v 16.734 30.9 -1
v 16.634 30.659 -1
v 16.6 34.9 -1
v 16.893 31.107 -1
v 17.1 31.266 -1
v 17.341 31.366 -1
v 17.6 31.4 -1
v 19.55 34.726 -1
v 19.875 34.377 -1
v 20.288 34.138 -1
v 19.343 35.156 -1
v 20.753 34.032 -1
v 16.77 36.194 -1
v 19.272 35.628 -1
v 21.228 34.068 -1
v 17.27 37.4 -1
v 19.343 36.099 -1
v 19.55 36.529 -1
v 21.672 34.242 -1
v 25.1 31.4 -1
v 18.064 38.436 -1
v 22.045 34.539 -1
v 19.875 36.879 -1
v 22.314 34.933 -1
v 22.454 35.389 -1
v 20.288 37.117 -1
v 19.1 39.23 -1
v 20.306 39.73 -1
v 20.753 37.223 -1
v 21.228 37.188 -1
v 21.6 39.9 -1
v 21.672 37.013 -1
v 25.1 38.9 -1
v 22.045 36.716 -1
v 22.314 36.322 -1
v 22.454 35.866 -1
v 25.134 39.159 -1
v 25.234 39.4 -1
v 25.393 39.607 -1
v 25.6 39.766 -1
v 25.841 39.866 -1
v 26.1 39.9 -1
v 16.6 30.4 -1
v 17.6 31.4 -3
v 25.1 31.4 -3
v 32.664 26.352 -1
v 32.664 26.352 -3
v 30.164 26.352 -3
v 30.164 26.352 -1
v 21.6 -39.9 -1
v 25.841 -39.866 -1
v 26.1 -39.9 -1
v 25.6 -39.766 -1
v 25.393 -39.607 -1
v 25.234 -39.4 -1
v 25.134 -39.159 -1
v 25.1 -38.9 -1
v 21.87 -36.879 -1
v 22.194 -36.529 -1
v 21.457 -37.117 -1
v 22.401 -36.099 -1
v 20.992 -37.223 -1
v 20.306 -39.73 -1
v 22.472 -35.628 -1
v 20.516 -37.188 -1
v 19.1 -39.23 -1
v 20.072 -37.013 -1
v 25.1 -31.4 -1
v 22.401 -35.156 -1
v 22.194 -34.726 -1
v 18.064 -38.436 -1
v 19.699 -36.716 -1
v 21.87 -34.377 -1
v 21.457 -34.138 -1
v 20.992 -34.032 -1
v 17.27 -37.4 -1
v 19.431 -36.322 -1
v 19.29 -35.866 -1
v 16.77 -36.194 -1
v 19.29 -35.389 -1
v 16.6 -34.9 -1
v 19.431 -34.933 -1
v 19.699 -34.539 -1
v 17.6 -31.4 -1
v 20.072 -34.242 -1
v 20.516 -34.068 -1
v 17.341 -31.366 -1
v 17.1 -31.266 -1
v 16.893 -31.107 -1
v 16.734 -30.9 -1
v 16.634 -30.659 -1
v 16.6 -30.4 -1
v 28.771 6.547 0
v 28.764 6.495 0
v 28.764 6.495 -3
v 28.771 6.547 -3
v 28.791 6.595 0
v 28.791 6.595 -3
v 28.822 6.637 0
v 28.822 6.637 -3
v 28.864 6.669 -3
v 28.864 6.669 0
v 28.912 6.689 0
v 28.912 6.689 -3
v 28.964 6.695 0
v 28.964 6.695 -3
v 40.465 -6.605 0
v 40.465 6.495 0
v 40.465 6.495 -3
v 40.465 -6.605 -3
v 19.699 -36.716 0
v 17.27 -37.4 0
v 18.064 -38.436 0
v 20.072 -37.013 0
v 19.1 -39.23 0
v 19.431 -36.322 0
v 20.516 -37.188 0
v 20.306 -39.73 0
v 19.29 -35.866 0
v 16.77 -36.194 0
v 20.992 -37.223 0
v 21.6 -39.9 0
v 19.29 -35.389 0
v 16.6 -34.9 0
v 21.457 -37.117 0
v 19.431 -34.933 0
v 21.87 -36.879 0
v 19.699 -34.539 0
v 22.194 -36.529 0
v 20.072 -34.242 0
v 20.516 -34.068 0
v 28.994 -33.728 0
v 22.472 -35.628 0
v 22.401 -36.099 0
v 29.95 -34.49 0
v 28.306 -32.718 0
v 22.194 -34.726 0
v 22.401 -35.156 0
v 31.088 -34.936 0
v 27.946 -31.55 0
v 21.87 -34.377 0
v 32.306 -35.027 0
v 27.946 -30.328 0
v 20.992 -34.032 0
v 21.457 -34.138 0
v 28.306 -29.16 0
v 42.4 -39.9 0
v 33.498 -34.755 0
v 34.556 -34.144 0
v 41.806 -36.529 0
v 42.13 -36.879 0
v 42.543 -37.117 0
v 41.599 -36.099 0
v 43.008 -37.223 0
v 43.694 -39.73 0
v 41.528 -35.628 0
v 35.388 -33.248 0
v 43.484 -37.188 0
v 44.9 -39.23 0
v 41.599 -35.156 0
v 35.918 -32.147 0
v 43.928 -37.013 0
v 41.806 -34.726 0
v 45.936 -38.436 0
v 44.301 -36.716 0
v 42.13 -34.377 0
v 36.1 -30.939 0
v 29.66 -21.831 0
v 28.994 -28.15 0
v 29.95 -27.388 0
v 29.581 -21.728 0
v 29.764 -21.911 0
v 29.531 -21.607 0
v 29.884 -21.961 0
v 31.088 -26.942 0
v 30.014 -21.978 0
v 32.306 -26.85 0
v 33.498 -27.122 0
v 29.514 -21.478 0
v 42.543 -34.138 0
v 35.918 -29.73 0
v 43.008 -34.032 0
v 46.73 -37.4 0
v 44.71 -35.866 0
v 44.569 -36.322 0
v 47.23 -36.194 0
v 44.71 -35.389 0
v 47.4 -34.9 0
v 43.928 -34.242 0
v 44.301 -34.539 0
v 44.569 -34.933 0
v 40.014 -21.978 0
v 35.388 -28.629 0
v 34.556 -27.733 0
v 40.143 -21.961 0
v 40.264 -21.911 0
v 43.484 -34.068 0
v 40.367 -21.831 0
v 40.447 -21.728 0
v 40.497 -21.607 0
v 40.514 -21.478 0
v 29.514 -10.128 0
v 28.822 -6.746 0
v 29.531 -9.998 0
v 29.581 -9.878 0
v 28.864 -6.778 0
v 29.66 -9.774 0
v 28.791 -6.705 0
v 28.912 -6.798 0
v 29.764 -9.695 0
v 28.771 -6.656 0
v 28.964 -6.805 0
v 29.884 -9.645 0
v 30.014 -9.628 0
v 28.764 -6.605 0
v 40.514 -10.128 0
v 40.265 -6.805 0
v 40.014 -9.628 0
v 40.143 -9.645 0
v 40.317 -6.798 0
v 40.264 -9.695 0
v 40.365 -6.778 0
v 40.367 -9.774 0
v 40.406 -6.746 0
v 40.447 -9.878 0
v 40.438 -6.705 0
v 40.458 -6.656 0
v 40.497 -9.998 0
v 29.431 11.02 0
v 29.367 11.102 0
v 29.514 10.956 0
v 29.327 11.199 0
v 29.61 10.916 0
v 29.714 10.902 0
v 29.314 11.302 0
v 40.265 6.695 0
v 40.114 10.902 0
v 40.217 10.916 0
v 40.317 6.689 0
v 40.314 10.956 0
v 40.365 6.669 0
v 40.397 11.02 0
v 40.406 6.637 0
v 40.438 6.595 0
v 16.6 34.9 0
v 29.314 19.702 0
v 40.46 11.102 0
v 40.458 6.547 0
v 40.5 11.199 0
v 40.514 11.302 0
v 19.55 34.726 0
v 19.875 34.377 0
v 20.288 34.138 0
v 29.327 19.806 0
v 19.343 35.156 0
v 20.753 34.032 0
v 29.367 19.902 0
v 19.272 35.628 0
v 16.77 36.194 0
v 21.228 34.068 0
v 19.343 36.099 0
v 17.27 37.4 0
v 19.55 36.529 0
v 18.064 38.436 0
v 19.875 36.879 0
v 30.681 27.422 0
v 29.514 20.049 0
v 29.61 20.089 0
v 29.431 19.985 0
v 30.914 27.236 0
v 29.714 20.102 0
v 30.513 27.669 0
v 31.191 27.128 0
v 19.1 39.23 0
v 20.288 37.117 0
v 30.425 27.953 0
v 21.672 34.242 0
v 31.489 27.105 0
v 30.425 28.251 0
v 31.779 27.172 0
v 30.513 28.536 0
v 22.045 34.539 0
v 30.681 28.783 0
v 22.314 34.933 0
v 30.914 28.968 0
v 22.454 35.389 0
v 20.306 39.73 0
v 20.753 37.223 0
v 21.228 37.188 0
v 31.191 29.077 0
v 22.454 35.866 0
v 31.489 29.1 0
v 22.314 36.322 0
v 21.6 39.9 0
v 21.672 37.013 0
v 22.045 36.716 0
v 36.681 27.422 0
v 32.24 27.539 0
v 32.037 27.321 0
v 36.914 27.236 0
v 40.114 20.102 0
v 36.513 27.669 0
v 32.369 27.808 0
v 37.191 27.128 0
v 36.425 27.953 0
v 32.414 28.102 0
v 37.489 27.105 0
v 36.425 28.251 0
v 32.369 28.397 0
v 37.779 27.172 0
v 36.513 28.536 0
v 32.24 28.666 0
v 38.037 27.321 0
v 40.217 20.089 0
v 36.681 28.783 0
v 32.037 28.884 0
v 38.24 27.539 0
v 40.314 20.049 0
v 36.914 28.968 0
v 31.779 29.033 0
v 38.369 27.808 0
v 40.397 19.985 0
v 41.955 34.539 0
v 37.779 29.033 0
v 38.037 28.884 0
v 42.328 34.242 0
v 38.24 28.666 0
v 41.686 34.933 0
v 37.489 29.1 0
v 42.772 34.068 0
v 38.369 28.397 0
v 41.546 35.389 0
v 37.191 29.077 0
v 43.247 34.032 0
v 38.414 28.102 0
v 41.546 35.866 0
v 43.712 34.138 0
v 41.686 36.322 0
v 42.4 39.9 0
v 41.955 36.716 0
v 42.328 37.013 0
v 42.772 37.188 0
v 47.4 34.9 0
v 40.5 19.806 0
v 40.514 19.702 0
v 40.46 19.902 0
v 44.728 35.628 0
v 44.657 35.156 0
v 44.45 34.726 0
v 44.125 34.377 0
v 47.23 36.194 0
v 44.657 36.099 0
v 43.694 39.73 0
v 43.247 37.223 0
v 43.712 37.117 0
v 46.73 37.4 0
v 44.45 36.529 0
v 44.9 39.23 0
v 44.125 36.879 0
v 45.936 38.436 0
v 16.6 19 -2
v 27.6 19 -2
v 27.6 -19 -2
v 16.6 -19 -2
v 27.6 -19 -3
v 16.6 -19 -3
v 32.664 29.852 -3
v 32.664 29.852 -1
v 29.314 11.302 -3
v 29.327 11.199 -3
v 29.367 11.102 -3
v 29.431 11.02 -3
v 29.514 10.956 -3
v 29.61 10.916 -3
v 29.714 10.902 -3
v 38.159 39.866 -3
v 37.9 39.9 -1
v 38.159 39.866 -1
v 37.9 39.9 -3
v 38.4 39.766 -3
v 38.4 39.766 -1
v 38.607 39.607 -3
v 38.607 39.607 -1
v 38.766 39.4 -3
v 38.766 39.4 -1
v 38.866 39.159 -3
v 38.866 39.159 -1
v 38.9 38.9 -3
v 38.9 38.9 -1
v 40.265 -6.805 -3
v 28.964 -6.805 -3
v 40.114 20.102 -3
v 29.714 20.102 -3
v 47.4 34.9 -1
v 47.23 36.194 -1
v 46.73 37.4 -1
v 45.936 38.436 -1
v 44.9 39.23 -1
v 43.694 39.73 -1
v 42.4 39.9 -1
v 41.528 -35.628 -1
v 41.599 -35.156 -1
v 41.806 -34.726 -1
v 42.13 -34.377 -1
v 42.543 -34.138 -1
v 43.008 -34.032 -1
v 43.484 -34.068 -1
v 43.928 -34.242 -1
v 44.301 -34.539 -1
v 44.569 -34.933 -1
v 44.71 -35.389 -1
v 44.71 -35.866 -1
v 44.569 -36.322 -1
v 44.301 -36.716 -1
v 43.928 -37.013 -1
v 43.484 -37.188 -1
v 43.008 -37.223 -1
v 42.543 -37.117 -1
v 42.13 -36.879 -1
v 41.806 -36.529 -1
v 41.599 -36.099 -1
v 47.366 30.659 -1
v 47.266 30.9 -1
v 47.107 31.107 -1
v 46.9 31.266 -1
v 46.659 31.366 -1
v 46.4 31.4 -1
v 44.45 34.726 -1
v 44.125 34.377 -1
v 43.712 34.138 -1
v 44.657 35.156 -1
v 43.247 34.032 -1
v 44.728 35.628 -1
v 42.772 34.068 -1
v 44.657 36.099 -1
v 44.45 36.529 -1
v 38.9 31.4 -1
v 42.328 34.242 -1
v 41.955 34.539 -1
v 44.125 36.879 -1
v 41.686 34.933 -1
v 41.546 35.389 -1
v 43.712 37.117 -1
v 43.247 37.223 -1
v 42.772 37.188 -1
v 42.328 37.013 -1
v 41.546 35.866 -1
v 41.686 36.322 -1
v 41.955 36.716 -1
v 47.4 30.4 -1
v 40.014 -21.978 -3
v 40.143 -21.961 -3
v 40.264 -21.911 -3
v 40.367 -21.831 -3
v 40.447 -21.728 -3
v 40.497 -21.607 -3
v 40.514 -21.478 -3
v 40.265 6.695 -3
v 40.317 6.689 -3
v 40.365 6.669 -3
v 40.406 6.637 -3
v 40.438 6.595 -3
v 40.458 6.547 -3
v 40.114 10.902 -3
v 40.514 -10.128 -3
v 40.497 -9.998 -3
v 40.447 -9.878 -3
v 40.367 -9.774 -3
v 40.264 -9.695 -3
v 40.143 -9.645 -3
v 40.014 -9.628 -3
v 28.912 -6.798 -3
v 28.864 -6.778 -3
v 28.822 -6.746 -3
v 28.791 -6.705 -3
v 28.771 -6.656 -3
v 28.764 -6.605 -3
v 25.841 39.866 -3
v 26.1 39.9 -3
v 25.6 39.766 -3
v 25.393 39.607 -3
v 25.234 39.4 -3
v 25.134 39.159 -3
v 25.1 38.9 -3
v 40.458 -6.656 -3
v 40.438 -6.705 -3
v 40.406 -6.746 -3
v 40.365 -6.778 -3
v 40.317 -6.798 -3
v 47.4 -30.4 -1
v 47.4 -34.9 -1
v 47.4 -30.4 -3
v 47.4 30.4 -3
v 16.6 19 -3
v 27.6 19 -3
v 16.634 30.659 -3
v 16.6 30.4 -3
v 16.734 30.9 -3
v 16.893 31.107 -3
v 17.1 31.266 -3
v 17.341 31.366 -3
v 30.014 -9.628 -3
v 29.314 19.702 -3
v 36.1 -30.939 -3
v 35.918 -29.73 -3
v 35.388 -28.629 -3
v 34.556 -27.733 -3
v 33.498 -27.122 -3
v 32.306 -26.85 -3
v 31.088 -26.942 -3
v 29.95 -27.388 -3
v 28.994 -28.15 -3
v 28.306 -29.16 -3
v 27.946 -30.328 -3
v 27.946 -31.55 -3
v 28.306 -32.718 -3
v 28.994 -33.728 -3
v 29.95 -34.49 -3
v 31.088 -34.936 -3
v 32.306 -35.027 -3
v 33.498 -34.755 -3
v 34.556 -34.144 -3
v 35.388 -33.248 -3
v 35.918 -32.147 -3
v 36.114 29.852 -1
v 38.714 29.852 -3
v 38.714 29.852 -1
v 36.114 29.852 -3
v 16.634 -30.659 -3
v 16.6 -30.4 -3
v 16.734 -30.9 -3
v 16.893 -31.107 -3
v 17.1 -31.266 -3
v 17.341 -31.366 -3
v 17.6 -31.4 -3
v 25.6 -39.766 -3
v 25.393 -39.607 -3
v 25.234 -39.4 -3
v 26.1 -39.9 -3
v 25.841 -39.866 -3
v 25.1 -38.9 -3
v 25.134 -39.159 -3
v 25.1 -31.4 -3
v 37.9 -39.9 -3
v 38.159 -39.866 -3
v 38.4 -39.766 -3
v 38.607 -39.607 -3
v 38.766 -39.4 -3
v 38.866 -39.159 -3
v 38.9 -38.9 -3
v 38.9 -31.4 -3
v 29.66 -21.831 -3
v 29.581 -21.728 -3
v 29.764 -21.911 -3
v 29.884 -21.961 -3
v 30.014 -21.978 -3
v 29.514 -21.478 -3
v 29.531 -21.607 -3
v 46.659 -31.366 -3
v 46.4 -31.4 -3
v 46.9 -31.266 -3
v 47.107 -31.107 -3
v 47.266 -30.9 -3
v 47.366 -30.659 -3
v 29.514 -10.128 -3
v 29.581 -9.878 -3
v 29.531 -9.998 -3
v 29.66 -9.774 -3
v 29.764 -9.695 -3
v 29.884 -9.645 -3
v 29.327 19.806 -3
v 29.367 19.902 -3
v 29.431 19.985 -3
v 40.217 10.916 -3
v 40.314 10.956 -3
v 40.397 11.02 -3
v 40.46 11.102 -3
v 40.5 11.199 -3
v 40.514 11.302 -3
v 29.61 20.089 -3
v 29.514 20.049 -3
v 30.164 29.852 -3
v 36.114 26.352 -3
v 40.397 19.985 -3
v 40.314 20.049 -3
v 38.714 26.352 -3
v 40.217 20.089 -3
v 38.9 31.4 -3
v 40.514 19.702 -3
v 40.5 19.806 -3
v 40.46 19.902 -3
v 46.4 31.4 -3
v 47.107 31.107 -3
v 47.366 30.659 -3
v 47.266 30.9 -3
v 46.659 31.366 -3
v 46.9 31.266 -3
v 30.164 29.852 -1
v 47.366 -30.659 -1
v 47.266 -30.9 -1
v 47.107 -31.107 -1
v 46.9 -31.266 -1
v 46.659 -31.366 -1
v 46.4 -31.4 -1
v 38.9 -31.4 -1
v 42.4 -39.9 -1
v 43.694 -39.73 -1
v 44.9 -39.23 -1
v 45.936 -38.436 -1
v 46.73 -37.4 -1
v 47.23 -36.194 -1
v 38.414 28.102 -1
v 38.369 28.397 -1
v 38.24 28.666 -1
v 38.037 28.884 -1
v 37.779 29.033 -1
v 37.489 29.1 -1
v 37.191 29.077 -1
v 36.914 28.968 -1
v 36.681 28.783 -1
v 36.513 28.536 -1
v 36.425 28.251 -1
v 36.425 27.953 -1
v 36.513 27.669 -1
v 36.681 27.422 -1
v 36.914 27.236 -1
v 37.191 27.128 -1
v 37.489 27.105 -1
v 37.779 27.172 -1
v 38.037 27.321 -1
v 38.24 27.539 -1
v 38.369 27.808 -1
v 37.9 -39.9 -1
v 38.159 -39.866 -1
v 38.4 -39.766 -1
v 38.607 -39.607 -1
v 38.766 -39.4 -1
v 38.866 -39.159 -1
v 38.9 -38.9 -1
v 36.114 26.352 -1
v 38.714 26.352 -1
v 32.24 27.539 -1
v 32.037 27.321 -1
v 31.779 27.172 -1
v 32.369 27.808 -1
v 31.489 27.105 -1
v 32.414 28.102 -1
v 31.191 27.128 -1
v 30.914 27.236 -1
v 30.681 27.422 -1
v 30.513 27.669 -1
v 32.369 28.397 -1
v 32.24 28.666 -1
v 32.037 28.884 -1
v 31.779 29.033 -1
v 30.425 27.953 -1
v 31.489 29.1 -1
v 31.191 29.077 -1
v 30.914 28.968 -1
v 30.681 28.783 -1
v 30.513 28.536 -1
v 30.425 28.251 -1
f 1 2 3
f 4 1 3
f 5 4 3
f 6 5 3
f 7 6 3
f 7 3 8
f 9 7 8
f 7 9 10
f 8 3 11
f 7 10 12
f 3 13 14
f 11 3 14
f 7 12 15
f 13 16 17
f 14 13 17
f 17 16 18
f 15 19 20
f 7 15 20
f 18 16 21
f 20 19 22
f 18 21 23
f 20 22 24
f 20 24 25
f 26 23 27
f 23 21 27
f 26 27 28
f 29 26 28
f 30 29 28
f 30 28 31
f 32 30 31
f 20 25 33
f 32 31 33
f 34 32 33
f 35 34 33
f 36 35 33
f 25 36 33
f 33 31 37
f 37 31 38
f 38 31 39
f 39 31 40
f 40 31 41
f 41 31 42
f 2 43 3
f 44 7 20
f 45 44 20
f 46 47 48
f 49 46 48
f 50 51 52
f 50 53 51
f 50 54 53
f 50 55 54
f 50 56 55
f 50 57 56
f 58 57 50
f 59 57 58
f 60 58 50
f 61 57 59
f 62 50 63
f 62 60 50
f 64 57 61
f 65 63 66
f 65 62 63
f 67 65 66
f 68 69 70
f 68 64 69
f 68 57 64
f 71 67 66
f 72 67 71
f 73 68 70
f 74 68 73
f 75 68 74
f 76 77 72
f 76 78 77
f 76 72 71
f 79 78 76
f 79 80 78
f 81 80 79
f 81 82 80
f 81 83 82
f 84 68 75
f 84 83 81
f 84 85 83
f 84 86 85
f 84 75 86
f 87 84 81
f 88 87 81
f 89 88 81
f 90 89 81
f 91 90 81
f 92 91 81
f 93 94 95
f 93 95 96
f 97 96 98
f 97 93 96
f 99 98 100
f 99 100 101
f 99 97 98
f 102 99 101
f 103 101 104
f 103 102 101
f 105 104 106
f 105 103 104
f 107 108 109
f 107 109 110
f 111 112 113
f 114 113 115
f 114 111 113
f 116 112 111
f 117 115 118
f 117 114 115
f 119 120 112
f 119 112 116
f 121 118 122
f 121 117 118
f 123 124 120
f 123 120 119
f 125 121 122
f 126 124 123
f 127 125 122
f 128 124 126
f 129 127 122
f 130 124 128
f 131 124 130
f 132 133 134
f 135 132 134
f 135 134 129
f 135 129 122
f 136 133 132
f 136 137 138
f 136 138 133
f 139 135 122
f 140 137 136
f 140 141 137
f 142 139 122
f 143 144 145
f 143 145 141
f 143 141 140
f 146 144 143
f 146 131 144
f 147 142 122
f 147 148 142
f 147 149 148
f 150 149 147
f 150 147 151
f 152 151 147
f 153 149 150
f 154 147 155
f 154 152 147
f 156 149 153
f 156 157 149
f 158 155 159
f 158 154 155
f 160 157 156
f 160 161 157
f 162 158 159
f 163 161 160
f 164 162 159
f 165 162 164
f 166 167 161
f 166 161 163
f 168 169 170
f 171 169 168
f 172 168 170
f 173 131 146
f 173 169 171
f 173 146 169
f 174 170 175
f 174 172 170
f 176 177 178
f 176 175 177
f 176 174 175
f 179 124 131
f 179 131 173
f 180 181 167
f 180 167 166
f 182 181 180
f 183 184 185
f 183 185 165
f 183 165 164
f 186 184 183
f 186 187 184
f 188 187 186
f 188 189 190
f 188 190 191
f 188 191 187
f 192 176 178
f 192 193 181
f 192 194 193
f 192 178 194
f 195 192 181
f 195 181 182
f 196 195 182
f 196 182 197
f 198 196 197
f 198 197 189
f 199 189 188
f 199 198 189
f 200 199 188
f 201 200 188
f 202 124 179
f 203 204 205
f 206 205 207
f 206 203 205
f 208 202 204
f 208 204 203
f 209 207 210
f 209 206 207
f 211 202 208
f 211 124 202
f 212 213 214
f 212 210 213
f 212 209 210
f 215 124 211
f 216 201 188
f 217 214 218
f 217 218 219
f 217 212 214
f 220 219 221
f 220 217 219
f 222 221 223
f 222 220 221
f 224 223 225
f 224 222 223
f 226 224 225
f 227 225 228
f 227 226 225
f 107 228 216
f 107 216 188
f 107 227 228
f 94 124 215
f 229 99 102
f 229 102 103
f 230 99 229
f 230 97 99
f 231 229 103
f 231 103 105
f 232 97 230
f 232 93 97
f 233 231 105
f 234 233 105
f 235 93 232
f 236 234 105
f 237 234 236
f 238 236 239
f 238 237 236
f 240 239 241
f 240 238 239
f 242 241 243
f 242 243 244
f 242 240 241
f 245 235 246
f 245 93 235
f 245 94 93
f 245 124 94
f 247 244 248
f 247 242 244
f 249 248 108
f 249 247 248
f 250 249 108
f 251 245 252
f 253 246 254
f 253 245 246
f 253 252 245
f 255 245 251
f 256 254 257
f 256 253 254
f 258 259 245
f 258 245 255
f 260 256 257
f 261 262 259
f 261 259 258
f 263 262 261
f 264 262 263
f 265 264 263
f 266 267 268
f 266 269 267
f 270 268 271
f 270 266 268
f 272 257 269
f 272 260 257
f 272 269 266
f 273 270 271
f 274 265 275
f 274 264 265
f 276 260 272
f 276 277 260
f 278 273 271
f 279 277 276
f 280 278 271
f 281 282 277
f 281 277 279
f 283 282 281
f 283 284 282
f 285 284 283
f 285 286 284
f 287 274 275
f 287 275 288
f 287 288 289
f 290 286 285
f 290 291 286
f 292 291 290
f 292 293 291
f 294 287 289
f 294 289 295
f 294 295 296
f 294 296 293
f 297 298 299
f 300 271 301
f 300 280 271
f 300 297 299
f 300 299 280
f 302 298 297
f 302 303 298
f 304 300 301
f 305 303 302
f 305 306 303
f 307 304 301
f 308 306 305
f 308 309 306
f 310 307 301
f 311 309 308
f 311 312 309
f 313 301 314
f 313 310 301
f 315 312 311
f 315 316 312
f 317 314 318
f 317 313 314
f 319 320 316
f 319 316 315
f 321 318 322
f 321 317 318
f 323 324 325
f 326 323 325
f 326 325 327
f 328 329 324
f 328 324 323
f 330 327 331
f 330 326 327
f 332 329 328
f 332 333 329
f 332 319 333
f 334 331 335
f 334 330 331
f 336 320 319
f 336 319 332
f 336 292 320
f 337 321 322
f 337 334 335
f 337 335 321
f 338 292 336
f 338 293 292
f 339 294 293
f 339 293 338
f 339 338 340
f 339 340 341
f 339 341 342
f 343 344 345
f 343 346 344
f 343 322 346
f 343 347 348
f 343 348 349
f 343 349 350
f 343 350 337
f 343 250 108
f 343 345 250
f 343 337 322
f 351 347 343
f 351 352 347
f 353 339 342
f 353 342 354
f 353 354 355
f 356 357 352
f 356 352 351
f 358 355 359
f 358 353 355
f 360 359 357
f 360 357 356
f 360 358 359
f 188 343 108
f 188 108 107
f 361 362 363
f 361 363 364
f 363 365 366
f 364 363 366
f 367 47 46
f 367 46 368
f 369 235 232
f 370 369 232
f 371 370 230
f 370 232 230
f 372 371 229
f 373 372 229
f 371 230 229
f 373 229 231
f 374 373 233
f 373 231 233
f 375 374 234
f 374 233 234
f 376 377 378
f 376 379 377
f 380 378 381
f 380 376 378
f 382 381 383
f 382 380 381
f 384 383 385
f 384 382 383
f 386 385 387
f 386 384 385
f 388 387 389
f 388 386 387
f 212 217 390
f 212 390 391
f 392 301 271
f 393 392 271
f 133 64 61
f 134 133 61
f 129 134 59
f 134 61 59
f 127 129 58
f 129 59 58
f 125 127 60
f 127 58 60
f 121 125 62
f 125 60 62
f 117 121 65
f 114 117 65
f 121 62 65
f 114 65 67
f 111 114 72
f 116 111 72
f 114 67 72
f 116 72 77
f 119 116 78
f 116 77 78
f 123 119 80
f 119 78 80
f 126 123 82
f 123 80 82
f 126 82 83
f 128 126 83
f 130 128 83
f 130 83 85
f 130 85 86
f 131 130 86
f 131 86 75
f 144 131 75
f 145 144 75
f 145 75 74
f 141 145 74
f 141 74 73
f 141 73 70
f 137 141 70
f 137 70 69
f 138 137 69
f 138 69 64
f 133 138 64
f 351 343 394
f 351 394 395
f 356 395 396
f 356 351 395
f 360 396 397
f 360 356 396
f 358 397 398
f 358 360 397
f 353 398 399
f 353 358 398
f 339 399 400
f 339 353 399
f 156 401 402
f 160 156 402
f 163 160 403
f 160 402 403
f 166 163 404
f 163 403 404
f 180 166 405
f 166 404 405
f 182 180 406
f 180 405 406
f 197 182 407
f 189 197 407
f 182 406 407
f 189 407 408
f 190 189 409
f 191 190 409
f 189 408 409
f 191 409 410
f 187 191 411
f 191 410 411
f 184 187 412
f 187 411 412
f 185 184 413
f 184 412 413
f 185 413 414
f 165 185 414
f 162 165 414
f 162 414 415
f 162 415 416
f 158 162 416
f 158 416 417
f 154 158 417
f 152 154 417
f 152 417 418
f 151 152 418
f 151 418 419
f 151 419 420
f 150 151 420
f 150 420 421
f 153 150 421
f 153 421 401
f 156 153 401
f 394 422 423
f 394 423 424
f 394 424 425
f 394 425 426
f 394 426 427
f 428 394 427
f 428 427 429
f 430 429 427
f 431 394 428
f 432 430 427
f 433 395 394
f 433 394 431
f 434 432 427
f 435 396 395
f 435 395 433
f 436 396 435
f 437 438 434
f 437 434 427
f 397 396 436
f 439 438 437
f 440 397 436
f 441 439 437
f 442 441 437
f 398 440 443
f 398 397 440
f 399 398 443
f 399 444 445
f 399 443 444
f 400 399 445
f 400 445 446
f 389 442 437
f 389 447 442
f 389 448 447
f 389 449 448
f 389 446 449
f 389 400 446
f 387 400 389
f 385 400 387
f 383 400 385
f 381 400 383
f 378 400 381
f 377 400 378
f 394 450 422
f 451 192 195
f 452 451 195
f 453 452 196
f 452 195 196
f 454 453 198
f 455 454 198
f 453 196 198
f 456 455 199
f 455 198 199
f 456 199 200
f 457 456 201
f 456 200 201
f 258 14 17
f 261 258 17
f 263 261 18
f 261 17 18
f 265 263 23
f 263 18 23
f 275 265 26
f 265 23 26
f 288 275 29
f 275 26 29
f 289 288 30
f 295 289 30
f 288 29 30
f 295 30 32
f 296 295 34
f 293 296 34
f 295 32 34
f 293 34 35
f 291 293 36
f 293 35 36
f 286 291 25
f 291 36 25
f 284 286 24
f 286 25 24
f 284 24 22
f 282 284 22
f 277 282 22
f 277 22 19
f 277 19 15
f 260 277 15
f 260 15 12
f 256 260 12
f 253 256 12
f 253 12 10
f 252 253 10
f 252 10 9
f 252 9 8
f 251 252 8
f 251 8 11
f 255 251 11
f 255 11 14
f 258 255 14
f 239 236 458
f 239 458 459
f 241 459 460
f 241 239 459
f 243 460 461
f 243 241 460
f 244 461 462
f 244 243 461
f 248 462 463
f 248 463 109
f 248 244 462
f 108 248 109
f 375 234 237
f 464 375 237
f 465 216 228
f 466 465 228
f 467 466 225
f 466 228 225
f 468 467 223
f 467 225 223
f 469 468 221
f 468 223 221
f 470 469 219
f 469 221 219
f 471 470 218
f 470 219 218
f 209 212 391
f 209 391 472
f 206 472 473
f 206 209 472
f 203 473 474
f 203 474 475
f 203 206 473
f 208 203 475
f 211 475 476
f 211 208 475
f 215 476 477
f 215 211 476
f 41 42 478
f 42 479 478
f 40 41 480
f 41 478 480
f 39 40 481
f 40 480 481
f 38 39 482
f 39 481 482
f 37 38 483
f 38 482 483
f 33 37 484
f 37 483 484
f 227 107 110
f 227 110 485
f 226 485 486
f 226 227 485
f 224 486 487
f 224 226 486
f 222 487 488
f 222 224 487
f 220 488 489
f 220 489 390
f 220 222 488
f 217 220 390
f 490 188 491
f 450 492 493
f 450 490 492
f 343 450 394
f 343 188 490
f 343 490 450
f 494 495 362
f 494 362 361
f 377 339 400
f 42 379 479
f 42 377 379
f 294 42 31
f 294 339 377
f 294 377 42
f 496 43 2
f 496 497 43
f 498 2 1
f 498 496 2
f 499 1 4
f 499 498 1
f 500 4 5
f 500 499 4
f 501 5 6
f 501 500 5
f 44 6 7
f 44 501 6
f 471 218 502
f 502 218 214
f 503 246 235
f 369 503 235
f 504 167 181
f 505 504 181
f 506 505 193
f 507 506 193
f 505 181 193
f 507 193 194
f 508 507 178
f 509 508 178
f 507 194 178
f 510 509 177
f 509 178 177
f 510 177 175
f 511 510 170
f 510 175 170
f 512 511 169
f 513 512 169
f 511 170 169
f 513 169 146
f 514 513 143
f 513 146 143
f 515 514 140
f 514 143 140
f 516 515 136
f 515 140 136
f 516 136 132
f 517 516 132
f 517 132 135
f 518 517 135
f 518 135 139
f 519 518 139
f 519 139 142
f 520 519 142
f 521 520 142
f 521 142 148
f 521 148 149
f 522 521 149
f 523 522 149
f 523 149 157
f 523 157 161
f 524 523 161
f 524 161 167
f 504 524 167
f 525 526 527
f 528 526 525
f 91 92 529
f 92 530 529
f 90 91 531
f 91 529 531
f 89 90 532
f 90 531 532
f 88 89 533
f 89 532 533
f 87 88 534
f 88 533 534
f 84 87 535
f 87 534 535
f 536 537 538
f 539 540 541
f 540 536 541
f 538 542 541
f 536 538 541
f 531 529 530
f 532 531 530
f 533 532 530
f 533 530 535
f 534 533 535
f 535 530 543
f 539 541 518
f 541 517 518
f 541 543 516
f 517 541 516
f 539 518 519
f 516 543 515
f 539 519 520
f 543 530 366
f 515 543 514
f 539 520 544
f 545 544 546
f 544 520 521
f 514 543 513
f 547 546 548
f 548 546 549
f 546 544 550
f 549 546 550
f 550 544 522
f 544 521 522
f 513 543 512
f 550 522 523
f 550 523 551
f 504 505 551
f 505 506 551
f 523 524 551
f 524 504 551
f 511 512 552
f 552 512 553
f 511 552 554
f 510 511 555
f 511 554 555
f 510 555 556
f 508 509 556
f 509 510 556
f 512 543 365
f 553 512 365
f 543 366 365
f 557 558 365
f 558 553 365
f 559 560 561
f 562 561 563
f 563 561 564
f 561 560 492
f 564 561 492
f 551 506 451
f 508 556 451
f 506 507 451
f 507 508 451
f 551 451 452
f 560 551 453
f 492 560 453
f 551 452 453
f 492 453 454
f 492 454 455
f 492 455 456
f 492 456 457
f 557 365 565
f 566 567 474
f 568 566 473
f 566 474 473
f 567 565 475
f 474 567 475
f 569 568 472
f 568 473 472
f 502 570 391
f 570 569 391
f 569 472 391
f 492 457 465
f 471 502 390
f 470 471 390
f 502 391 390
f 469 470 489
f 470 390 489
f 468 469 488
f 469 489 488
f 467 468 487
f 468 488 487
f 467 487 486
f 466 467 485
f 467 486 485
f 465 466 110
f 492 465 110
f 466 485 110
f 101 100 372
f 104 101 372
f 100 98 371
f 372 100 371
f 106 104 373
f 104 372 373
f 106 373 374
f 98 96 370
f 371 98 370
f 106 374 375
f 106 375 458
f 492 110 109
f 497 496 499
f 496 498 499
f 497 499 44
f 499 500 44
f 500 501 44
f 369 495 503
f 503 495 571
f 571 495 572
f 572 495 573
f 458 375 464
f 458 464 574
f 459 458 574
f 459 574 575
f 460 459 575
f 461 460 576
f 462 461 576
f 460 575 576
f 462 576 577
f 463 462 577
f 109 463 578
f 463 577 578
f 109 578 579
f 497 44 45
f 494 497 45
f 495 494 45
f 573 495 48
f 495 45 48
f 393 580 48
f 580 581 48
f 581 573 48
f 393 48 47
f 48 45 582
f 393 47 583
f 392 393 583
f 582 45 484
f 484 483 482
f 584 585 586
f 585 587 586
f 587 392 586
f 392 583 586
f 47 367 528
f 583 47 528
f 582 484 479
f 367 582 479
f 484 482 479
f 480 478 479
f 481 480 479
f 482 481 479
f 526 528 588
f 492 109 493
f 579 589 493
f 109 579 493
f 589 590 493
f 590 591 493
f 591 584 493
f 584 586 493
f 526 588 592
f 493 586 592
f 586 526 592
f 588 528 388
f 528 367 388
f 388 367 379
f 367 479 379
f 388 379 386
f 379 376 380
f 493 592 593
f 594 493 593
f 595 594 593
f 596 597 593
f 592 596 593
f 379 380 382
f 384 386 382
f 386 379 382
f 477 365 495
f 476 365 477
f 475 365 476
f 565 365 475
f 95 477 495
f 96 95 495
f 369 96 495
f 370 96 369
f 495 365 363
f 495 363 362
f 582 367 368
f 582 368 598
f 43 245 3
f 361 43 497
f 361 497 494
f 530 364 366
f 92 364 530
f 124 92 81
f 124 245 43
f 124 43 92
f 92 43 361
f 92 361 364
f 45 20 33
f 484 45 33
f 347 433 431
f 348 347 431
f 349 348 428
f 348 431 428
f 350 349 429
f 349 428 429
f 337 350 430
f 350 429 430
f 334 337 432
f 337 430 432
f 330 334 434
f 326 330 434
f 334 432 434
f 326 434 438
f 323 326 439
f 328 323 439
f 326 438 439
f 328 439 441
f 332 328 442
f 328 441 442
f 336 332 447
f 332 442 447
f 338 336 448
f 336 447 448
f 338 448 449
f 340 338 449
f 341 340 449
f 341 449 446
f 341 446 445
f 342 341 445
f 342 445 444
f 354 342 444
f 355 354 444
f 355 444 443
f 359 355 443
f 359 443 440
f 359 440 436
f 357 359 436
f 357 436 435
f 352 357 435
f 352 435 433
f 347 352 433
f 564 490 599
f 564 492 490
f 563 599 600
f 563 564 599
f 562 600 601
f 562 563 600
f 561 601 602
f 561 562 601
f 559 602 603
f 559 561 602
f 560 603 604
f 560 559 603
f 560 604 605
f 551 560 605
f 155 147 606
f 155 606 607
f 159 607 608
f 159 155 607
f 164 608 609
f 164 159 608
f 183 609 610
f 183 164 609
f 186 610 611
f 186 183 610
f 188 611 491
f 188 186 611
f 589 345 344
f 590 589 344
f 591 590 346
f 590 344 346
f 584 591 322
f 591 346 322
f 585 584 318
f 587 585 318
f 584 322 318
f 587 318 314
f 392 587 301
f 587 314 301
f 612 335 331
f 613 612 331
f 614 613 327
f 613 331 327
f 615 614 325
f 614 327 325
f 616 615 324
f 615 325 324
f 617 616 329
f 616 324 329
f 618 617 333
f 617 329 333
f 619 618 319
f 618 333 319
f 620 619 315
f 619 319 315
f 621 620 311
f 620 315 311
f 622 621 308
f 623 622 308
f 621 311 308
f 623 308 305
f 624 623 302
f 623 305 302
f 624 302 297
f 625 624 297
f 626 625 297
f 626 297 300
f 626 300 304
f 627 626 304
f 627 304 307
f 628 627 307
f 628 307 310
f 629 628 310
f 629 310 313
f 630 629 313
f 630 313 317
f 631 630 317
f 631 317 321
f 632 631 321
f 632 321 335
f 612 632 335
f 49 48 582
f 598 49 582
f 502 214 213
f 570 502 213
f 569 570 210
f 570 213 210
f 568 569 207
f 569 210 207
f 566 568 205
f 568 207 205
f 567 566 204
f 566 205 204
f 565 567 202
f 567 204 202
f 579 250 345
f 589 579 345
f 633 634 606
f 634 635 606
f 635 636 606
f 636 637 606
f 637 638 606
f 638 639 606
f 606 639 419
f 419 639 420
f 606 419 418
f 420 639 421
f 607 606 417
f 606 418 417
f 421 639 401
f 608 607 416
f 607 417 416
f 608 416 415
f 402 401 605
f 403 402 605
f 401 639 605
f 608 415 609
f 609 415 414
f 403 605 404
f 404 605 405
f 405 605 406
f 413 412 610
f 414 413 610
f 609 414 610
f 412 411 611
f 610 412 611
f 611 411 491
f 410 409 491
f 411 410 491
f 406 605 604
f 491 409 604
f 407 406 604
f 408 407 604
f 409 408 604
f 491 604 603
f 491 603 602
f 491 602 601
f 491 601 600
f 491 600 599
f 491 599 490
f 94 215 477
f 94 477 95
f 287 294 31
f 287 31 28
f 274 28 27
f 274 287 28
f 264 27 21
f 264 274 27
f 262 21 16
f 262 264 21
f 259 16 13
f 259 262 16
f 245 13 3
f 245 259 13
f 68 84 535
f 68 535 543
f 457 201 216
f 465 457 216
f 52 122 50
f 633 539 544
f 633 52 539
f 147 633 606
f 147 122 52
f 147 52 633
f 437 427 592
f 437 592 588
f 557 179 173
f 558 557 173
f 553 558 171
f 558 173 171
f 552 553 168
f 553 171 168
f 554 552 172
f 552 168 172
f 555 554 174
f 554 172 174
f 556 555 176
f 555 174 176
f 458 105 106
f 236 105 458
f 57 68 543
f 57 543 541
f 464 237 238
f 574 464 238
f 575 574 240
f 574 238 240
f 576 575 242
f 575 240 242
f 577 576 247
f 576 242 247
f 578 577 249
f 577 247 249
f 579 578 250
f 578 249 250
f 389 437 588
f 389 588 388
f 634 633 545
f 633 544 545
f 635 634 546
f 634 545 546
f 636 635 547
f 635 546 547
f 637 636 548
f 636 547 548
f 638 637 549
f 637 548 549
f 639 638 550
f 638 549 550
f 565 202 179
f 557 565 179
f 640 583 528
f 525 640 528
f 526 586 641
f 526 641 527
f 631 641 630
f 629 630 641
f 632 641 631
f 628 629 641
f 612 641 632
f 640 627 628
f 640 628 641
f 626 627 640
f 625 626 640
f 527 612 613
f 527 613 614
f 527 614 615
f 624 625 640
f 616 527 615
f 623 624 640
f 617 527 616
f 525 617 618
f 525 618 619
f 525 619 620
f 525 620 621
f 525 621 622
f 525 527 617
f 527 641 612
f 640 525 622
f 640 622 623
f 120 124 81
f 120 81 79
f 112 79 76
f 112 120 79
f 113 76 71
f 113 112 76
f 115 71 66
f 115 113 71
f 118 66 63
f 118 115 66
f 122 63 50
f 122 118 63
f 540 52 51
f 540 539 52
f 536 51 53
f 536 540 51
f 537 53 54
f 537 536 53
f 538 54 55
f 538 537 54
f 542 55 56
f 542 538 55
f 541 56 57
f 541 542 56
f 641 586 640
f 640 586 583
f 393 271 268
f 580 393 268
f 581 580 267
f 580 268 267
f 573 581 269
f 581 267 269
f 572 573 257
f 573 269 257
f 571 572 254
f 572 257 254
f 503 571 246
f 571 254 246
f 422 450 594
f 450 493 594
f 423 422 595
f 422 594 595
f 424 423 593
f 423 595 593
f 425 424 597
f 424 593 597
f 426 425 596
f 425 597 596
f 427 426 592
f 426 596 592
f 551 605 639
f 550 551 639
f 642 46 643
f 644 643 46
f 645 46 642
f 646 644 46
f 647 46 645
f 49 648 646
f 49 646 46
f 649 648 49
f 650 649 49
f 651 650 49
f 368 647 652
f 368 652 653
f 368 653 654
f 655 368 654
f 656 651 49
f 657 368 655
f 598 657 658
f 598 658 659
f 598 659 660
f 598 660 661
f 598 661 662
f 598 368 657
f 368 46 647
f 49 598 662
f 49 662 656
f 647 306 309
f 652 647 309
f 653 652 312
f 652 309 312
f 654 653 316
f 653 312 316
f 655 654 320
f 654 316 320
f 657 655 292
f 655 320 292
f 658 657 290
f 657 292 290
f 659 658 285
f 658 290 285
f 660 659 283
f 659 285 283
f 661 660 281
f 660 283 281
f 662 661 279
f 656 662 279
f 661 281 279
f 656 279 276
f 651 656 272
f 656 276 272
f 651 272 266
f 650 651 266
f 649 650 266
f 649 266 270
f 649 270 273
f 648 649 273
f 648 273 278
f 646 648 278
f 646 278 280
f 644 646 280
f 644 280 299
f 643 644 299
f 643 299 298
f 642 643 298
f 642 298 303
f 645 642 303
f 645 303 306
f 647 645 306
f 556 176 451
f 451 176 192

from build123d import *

# Parameters (mm, degrees)
SKETCH_1_R          = 1
EXTRUDE_1_DEPTH     = 3
SKETCH_2_W          = 11
SKETCH_2_H          = 38
CUT_EXTRUDE_1_DEPTH = 1
CUT_EXTRUDE_START   = -2
CUT_EXTRUDE_2_DEPTH = 2
SKETCH_4_R          = 1.6
CUT_EXTRUDE_3_DEPTH = 62.990079852
SKETCH_6_W          = 2.6
SKETCH_6_H          = 3.5
SKETCH_6_W_2        = 2.5
CUT_EXTRUDE_4_DEPTH = 2
SKETCH_7_R          = 4.1
CUT_EXTRUDE_5_DEPTH = 63.030395775
FILLET_1_R          = 1


with BuildPart() as part:
    # 草图1 → 凸台-拉伸1 (new body)
    with BuildSketch(Plane.XY):
        with BuildLine():
            Line((47.4, -34.9), (47.4, 34.9))
            ThreePointArc((47.4, 34.9), (45.935533906, 38.435533906), (42.4, 39.9))
            Line((42.4, 39.9), (21.6, 39.9))
            ThreePointArc((21.6, 39.9), (18.064466094, 38.435533906), (16.6, 34.9))
            Line((16.6, 34.9), (16.6, -34.9))
            ThreePointArc((16.6, -34.9), (18.064466094, -38.435533906), (21.6, -39.9))
            Line((21.6, -39.9), (42.4, -39.9))
            ThreePointArc((42.4, -39.9), (45.935533906, -38.435533906), (47.4, -34.9))
        make_face()
        with Locations((37.413843028, 28.102429875)):
            Circle(SKETCH_1_R, mode=Mode.SUBTRACT)
        with Locations((31.413843028, 28.102429875)):
            Circle(SKETCH_1_R, mode=Mode.SUBTRACT)
        with BuildLine():
            Line((40.513850359, -21.477641558), (40.513850359, -10.127641653))
            ThreePointArc((40.513850359, -10.127641653), (40.367403749, -9.774088262), (40.013850359, -9.627641653))
            Line((40.013850359, -9.627641653), (30.013850359, -9.627641653))
            ThreePointArc((30.013850359, -9.627641653), (29.660296968, -9.774088262), (29.513850359, -10.127641653))
            Line((29.513850359, -10.127641653), (29.513850359, -21.477641558))
            ThreePointArc((29.513850359, -21.477641558), (29.660296968, -21.831194949), (30.013850359, -21.977641558))
            Line((30.013850359, -21.977641558), (40.013850359, -21.977641558))
            ThreePointArc((40.013850359, -21.977641558), (40.367403749, -21.831194949), (40.513850359, -21.477641558))
        make_face(mode=Mode.SUBTRACT)
        with BuildLine():
            Line((40.464996896, 6.495389649), (40.464996896, -6.604609867))
            ThreePointArc((40.464996896, -6.604609867), (40.406418252, -6.746031223), (40.264996896, -6.804609867))
            Line((40.264996896, -6.804609867), (28.963873947, -6.804609867))
            ThreePointArc((28.963873947, -6.804609867), (28.822452591, -6.746031223), (28.763873947, -6.604609867))
            Line((28.763873947, -6.604609867), (28.763873947, 6.495389649))
            ThreePointArc((28.763873947, 6.495389649), (28.822452591, 6.636811005), (28.963873947, 6.695389649))
            Line((28.963873947, 6.695389649), (40.264996896, 6.695389649))
            ThreePointArc((40.264996896, 6.695389649), (40.406418252, 6.636811005), (40.464996896, 6.495389649))
        make_face(mode=Mode.SUBTRACT)
        with BuildLine():
            Line((40.513843009, 11.302412116), (40.513843009, 19.702429875))
            ThreePointArc((40.513843009, 19.702429875), (40.396685721, 19.985272588), (40.113843009, 20.102429875))
            Line((40.113843009, 20.102429875), (29.713821303, 20.102429875))
            ThreePointArc((29.713821303, 20.102429875), (29.43097859, 19.985272588), (29.313821303, 19.702429875))
            Line((29.313821303, 19.702429875), (29.313821303, 11.302412116))
            ThreePointArc((29.313821303, 11.302412116), (29.43097859, 11.019569403), (29.713821303, 10.902412116))
            Line((29.713821303, 10.902412116), (40.113843009, 10.902412116))
            ThreePointArc((40.113843009, 10.902412116), (40.396685721, 11.019569403), (40.513843009, 11.302412116))
        make_face(mode=Mode.SUBTRACT)
    extrude(amount=-EXTRUDE_1_DEPTH)

    # 草图2 → 切除-拉伸1 (cut)
    with BuildSketch(Plane(origin=(0, 0, -3), x_dir=(-1, 0, 0), z_dir=(0, 0, -1))):
        with Locations((-22.1, 0)):
            Rectangle(SKETCH_2_W, SKETCH_2_H)
    extrude(amount=-CUT_EXTRUDE_1_DEPTH, mode=Mode.SUBTRACT)

    # 草图3 → 切除-拉伸2 (cut)
    with BuildSketch(Plane(origin=(0, 0, -3), x_dir=(-1, 0, 0), z_dir=(0, 0, -1)).offset(CUT_EXTRUDE_START)):
        with BuildLine():
            Line((-47.4, -31.4), (-38.9, -31.4))
            Line((-38.9, -31.4), (-38.9, -39.9))
            Line((-38.9, -39.9), (-42.4, -39.9))
            ThreePointArc((-42.4, -39.9), (-45.935533906, -38.435533906), (-47.4, -34.9))
            Line((-47.4, -34.9), (-47.4, -31.4))
        make_face()
        with BuildLine():
            Line((-47.4, 34.9), (-47.4, 31.4))
            Line((-47.4, 31.4), (-38.9, 31.4))
            Line((-38.9, 31.4), (-38.9, 39.9))
            Line((-38.9, 39.9), (-42.4, 39.9))
            ThreePointArc((-42.4, 39.9), (-45.935533906, 38.435533906), (-47.4, 34.9))
        make_face()
        with BuildLine():
            Line((-16.6, 31.4), (-25.1, 31.4))
            Line((-25.1, 31.4), (-25.1, 39.9))
            Line((-25.1, 39.9), (-21.6, 39.9))
            ThreePointArc((-21.6, 39.9), (-18.064466094, 38.435533906), (-16.6, 34.9))
            Line((-16.6, 34.9), (-16.6, 31.4))
        make_face()
        with BuildLine():
            Line((-16.6, -34.9), (-16.6, -31.4))
            Line((-16.6, -31.4), (-25.1, -31.4))
            Line((-25.1, -31.4), (-25.1, -39.9))
            Line((-25.1, -39.9), (-21.6, -39.9))
            ThreePointArc((-21.6, -39.9), (-18.064466094, -38.435533906), (-16.6, -34.9))
        make_face()
    extrude(amount=CUT_EXTRUDE_2_DEPTH, mode=Mode.SUBTRACT)

    # 草图4 → 切除-拉伸3 (cut, through all)
    with BuildSketch(Plane(origin=(0, 0, -1), x_dir=(-1, 0, 0), z_dir=(0, 0, -1))):
        with Locations((-20.872307757, 35.627692243)):
            Circle(SKETCH_4_R)
        with Locations(Location((-20.872307757, -35.627692243, 0), (0, 0, 180))):
            Circle(SKETCH_4_R)
        with Locations((-43.127692243, -35.627692243)):
            Circle(SKETCH_4_R)
        with Locations(Location((-43.127692243, 35.627692243, 0), (0, 0, 180))):
            Circle(SKETCH_4_R)
    extrude(amount=-CUT_EXTRUDE_3_DEPTH, mode=Mode.SUBTRACT)

    # 草图6 → 切除-拉伸4 (cut)
    with BuildSketch(Plane(origin=(0, 0, -3), x_dir=(-1, 0, 0), z_dir=(0, 0, -1))):
        with Locations((-37.413843028, 28.102429875)):
            Rectangle(SKETCH_6_W, SKETCH_6_H)
        with Locations((-31.413843028, 28.102429875)):
            Rectangle(SKETCH_6_W_2, SKETCH_6_H)
    extrude(amount=-CUT_EXTRUDE_4_DEPTH, mode=Mode.SUBTRACT)

    # 草图7 → 切除-拉伸5 (cut, through all)
    with BuildSketch(Plane.XY):
        with Locations((32, -30.938820779)):
            Circle(SKETCH_7_R)
    extrude(amount=-CUT_EXTRUDE_5_DEPTH, mode=Mode.SUBTRACT)

    # 圆角1
    fillet_1_edges = [part.edges().sort_by_distance(p)[0] for p in [
        (25.1, -39.9, -2),
        (16.6, -31.4, -2),
        (16.6, 31.4, -2),
        (25.1, 39.9, -2),
        (38.9, 39.9, -2),
        (47.4, 31.4, -2),
        (47.4, -31.4, -2),
        (38.9, -39.9, -2),
    ]]
    fillet(fillet_1_edges, radius=FILLET_1_R)


solid = part.part
